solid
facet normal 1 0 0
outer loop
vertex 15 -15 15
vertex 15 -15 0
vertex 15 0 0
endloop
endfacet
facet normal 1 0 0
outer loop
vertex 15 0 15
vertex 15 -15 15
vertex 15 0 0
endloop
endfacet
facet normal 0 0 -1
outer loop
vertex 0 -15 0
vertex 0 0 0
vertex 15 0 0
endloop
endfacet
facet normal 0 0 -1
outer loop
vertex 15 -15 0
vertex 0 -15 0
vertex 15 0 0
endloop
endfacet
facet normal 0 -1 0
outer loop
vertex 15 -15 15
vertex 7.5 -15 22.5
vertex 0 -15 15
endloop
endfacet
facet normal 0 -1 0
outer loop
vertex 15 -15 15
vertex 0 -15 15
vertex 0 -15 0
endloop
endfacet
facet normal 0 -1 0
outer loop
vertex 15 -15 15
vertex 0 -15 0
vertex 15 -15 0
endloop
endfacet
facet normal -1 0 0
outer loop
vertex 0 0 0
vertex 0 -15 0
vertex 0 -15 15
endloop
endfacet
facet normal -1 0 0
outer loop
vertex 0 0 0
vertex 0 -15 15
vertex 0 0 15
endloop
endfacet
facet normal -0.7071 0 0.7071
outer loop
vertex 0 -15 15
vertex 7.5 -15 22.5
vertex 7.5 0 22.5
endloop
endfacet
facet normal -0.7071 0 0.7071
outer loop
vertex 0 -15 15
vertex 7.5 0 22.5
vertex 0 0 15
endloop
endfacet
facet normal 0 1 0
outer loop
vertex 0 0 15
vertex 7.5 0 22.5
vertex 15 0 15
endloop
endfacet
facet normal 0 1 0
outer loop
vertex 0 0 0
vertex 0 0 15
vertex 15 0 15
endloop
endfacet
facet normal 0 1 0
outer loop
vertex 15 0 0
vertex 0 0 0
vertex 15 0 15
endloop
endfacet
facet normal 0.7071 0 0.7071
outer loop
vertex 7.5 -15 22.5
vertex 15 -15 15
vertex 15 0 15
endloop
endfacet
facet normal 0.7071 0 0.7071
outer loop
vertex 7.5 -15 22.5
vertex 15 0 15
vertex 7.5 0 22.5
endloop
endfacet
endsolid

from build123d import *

# Parameters (mm, degrees)
F0_W     = 15
F0_H     = 15
F1_DEPTH = 15
F3_DEPTH = 15


with BuildPart() as f1:
    # F0 (on Top) → F1 (new body)
    with BuildSketch(Plane.XY):
        with Locations((7.5, -7.5)):
            Rectangle(F0_W, F0_H)
    extrude(amount=F1_DEPTH)

    # F2 (on face) → F3 (join)
    with BuildSketch(Plane.XZ.offset(15)):
        Polygon((7.5, 22.5), (0, 15), (15, 15), align=None)
    extrude(amount=-F3_DEPTH)


solid = f1.part
